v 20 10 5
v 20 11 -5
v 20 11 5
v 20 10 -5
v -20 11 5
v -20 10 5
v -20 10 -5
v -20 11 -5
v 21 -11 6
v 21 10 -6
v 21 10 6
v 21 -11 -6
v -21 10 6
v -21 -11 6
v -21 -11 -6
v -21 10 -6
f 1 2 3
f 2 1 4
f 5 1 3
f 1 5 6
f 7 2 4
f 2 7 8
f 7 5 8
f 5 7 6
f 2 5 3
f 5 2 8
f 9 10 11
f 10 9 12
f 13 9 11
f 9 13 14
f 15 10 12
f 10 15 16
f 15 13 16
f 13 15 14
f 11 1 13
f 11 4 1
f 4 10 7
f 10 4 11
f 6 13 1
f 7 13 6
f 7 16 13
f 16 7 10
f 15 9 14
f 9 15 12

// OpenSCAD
// Unit of length: Unit.MM
union()
{
   color(c = [1.0, 0.0, 0.0, 1.0])
   {
      translate(v = [0.0, 0.5, 0.0])
      {
         cube(size = [40.0, 21.0, 10.0], center = true);
      }
   }
   translate(v = [0.0, -0.5, 0.0])
   {
      cube(size = [42.0, 21.0, 12.0], center = true);
   }
}
